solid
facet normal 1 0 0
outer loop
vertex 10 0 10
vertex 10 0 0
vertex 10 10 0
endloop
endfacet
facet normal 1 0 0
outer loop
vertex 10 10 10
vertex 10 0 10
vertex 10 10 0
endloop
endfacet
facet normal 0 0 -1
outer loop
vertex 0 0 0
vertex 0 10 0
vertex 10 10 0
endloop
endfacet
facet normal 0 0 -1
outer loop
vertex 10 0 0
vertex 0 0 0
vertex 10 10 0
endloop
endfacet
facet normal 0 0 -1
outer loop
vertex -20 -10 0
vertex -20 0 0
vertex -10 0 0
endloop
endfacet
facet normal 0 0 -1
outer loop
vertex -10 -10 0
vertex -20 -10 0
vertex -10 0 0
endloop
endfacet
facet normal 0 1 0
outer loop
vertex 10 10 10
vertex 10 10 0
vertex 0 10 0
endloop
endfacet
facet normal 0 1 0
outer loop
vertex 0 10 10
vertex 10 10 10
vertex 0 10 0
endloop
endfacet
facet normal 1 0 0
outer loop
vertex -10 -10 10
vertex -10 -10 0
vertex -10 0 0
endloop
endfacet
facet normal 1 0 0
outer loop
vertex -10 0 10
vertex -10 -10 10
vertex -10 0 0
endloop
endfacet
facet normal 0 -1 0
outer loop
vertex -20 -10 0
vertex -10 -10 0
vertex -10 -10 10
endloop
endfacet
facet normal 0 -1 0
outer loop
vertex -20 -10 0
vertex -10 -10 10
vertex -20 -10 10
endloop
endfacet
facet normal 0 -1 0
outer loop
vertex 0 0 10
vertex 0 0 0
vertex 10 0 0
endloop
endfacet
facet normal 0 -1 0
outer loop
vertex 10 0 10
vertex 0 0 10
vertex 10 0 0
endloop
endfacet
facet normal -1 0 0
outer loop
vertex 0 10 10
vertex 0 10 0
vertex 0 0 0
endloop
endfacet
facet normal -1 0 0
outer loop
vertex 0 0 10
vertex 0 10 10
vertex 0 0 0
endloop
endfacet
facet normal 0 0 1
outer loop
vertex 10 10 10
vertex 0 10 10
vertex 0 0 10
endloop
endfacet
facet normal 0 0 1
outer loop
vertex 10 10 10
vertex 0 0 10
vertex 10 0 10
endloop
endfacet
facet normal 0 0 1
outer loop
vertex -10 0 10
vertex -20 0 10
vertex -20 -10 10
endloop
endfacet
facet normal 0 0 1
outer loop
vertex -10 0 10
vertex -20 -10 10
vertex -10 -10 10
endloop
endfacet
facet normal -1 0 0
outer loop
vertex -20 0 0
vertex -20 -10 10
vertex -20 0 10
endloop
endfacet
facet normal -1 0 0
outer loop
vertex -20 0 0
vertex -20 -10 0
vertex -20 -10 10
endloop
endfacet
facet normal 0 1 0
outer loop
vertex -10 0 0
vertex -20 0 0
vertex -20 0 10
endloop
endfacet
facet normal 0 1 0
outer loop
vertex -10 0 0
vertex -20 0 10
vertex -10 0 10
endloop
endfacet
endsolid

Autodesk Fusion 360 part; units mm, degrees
sketch "Sketch1" plane through (0, 0, 0) normal (0, 0, 1) x (1, 0, 0)
  line L0 (0, 0) -> (-10, 0)
  line L1 (-10, 0) -> (-10, 10)
  line L2 (-10, 10) -> (0, 10)
  line L3 (0, 10) -> (0, 0)
  line L4 (0, 0) -> (10, 0)
  line L5 (10, 0) -> (10, 10)
  line L6 (10, 10) -> (0, 10)
  line L7 (0, 10) -> (0, 0)
  line L8 (-10, 10) -> (0, 10)
  line L9 (0, 10) -> (0, -10)
  line L10 (0, -10) -> (-10, -10)
  line L11 (-10, -10) -> (-10, 10)
  line L12 (-10, -10) -> (-20, -10)
  line L13 (-20, -10) -> (-20, 0)
  line L14 (-20, 0) -> (-10, 0)
  line L15 (-10, 0) -> (-10, -10)
extrude "Extrude1" add sketch "Sketch1" along normal blind 10 contours L3 L4 L5 L6 L7 L9 makes body 1
extrude "Extrude4" add sketch "Sketch1" along normal blind 10 separate body contours L11 L12 L13 L14 L15 makes body 2
